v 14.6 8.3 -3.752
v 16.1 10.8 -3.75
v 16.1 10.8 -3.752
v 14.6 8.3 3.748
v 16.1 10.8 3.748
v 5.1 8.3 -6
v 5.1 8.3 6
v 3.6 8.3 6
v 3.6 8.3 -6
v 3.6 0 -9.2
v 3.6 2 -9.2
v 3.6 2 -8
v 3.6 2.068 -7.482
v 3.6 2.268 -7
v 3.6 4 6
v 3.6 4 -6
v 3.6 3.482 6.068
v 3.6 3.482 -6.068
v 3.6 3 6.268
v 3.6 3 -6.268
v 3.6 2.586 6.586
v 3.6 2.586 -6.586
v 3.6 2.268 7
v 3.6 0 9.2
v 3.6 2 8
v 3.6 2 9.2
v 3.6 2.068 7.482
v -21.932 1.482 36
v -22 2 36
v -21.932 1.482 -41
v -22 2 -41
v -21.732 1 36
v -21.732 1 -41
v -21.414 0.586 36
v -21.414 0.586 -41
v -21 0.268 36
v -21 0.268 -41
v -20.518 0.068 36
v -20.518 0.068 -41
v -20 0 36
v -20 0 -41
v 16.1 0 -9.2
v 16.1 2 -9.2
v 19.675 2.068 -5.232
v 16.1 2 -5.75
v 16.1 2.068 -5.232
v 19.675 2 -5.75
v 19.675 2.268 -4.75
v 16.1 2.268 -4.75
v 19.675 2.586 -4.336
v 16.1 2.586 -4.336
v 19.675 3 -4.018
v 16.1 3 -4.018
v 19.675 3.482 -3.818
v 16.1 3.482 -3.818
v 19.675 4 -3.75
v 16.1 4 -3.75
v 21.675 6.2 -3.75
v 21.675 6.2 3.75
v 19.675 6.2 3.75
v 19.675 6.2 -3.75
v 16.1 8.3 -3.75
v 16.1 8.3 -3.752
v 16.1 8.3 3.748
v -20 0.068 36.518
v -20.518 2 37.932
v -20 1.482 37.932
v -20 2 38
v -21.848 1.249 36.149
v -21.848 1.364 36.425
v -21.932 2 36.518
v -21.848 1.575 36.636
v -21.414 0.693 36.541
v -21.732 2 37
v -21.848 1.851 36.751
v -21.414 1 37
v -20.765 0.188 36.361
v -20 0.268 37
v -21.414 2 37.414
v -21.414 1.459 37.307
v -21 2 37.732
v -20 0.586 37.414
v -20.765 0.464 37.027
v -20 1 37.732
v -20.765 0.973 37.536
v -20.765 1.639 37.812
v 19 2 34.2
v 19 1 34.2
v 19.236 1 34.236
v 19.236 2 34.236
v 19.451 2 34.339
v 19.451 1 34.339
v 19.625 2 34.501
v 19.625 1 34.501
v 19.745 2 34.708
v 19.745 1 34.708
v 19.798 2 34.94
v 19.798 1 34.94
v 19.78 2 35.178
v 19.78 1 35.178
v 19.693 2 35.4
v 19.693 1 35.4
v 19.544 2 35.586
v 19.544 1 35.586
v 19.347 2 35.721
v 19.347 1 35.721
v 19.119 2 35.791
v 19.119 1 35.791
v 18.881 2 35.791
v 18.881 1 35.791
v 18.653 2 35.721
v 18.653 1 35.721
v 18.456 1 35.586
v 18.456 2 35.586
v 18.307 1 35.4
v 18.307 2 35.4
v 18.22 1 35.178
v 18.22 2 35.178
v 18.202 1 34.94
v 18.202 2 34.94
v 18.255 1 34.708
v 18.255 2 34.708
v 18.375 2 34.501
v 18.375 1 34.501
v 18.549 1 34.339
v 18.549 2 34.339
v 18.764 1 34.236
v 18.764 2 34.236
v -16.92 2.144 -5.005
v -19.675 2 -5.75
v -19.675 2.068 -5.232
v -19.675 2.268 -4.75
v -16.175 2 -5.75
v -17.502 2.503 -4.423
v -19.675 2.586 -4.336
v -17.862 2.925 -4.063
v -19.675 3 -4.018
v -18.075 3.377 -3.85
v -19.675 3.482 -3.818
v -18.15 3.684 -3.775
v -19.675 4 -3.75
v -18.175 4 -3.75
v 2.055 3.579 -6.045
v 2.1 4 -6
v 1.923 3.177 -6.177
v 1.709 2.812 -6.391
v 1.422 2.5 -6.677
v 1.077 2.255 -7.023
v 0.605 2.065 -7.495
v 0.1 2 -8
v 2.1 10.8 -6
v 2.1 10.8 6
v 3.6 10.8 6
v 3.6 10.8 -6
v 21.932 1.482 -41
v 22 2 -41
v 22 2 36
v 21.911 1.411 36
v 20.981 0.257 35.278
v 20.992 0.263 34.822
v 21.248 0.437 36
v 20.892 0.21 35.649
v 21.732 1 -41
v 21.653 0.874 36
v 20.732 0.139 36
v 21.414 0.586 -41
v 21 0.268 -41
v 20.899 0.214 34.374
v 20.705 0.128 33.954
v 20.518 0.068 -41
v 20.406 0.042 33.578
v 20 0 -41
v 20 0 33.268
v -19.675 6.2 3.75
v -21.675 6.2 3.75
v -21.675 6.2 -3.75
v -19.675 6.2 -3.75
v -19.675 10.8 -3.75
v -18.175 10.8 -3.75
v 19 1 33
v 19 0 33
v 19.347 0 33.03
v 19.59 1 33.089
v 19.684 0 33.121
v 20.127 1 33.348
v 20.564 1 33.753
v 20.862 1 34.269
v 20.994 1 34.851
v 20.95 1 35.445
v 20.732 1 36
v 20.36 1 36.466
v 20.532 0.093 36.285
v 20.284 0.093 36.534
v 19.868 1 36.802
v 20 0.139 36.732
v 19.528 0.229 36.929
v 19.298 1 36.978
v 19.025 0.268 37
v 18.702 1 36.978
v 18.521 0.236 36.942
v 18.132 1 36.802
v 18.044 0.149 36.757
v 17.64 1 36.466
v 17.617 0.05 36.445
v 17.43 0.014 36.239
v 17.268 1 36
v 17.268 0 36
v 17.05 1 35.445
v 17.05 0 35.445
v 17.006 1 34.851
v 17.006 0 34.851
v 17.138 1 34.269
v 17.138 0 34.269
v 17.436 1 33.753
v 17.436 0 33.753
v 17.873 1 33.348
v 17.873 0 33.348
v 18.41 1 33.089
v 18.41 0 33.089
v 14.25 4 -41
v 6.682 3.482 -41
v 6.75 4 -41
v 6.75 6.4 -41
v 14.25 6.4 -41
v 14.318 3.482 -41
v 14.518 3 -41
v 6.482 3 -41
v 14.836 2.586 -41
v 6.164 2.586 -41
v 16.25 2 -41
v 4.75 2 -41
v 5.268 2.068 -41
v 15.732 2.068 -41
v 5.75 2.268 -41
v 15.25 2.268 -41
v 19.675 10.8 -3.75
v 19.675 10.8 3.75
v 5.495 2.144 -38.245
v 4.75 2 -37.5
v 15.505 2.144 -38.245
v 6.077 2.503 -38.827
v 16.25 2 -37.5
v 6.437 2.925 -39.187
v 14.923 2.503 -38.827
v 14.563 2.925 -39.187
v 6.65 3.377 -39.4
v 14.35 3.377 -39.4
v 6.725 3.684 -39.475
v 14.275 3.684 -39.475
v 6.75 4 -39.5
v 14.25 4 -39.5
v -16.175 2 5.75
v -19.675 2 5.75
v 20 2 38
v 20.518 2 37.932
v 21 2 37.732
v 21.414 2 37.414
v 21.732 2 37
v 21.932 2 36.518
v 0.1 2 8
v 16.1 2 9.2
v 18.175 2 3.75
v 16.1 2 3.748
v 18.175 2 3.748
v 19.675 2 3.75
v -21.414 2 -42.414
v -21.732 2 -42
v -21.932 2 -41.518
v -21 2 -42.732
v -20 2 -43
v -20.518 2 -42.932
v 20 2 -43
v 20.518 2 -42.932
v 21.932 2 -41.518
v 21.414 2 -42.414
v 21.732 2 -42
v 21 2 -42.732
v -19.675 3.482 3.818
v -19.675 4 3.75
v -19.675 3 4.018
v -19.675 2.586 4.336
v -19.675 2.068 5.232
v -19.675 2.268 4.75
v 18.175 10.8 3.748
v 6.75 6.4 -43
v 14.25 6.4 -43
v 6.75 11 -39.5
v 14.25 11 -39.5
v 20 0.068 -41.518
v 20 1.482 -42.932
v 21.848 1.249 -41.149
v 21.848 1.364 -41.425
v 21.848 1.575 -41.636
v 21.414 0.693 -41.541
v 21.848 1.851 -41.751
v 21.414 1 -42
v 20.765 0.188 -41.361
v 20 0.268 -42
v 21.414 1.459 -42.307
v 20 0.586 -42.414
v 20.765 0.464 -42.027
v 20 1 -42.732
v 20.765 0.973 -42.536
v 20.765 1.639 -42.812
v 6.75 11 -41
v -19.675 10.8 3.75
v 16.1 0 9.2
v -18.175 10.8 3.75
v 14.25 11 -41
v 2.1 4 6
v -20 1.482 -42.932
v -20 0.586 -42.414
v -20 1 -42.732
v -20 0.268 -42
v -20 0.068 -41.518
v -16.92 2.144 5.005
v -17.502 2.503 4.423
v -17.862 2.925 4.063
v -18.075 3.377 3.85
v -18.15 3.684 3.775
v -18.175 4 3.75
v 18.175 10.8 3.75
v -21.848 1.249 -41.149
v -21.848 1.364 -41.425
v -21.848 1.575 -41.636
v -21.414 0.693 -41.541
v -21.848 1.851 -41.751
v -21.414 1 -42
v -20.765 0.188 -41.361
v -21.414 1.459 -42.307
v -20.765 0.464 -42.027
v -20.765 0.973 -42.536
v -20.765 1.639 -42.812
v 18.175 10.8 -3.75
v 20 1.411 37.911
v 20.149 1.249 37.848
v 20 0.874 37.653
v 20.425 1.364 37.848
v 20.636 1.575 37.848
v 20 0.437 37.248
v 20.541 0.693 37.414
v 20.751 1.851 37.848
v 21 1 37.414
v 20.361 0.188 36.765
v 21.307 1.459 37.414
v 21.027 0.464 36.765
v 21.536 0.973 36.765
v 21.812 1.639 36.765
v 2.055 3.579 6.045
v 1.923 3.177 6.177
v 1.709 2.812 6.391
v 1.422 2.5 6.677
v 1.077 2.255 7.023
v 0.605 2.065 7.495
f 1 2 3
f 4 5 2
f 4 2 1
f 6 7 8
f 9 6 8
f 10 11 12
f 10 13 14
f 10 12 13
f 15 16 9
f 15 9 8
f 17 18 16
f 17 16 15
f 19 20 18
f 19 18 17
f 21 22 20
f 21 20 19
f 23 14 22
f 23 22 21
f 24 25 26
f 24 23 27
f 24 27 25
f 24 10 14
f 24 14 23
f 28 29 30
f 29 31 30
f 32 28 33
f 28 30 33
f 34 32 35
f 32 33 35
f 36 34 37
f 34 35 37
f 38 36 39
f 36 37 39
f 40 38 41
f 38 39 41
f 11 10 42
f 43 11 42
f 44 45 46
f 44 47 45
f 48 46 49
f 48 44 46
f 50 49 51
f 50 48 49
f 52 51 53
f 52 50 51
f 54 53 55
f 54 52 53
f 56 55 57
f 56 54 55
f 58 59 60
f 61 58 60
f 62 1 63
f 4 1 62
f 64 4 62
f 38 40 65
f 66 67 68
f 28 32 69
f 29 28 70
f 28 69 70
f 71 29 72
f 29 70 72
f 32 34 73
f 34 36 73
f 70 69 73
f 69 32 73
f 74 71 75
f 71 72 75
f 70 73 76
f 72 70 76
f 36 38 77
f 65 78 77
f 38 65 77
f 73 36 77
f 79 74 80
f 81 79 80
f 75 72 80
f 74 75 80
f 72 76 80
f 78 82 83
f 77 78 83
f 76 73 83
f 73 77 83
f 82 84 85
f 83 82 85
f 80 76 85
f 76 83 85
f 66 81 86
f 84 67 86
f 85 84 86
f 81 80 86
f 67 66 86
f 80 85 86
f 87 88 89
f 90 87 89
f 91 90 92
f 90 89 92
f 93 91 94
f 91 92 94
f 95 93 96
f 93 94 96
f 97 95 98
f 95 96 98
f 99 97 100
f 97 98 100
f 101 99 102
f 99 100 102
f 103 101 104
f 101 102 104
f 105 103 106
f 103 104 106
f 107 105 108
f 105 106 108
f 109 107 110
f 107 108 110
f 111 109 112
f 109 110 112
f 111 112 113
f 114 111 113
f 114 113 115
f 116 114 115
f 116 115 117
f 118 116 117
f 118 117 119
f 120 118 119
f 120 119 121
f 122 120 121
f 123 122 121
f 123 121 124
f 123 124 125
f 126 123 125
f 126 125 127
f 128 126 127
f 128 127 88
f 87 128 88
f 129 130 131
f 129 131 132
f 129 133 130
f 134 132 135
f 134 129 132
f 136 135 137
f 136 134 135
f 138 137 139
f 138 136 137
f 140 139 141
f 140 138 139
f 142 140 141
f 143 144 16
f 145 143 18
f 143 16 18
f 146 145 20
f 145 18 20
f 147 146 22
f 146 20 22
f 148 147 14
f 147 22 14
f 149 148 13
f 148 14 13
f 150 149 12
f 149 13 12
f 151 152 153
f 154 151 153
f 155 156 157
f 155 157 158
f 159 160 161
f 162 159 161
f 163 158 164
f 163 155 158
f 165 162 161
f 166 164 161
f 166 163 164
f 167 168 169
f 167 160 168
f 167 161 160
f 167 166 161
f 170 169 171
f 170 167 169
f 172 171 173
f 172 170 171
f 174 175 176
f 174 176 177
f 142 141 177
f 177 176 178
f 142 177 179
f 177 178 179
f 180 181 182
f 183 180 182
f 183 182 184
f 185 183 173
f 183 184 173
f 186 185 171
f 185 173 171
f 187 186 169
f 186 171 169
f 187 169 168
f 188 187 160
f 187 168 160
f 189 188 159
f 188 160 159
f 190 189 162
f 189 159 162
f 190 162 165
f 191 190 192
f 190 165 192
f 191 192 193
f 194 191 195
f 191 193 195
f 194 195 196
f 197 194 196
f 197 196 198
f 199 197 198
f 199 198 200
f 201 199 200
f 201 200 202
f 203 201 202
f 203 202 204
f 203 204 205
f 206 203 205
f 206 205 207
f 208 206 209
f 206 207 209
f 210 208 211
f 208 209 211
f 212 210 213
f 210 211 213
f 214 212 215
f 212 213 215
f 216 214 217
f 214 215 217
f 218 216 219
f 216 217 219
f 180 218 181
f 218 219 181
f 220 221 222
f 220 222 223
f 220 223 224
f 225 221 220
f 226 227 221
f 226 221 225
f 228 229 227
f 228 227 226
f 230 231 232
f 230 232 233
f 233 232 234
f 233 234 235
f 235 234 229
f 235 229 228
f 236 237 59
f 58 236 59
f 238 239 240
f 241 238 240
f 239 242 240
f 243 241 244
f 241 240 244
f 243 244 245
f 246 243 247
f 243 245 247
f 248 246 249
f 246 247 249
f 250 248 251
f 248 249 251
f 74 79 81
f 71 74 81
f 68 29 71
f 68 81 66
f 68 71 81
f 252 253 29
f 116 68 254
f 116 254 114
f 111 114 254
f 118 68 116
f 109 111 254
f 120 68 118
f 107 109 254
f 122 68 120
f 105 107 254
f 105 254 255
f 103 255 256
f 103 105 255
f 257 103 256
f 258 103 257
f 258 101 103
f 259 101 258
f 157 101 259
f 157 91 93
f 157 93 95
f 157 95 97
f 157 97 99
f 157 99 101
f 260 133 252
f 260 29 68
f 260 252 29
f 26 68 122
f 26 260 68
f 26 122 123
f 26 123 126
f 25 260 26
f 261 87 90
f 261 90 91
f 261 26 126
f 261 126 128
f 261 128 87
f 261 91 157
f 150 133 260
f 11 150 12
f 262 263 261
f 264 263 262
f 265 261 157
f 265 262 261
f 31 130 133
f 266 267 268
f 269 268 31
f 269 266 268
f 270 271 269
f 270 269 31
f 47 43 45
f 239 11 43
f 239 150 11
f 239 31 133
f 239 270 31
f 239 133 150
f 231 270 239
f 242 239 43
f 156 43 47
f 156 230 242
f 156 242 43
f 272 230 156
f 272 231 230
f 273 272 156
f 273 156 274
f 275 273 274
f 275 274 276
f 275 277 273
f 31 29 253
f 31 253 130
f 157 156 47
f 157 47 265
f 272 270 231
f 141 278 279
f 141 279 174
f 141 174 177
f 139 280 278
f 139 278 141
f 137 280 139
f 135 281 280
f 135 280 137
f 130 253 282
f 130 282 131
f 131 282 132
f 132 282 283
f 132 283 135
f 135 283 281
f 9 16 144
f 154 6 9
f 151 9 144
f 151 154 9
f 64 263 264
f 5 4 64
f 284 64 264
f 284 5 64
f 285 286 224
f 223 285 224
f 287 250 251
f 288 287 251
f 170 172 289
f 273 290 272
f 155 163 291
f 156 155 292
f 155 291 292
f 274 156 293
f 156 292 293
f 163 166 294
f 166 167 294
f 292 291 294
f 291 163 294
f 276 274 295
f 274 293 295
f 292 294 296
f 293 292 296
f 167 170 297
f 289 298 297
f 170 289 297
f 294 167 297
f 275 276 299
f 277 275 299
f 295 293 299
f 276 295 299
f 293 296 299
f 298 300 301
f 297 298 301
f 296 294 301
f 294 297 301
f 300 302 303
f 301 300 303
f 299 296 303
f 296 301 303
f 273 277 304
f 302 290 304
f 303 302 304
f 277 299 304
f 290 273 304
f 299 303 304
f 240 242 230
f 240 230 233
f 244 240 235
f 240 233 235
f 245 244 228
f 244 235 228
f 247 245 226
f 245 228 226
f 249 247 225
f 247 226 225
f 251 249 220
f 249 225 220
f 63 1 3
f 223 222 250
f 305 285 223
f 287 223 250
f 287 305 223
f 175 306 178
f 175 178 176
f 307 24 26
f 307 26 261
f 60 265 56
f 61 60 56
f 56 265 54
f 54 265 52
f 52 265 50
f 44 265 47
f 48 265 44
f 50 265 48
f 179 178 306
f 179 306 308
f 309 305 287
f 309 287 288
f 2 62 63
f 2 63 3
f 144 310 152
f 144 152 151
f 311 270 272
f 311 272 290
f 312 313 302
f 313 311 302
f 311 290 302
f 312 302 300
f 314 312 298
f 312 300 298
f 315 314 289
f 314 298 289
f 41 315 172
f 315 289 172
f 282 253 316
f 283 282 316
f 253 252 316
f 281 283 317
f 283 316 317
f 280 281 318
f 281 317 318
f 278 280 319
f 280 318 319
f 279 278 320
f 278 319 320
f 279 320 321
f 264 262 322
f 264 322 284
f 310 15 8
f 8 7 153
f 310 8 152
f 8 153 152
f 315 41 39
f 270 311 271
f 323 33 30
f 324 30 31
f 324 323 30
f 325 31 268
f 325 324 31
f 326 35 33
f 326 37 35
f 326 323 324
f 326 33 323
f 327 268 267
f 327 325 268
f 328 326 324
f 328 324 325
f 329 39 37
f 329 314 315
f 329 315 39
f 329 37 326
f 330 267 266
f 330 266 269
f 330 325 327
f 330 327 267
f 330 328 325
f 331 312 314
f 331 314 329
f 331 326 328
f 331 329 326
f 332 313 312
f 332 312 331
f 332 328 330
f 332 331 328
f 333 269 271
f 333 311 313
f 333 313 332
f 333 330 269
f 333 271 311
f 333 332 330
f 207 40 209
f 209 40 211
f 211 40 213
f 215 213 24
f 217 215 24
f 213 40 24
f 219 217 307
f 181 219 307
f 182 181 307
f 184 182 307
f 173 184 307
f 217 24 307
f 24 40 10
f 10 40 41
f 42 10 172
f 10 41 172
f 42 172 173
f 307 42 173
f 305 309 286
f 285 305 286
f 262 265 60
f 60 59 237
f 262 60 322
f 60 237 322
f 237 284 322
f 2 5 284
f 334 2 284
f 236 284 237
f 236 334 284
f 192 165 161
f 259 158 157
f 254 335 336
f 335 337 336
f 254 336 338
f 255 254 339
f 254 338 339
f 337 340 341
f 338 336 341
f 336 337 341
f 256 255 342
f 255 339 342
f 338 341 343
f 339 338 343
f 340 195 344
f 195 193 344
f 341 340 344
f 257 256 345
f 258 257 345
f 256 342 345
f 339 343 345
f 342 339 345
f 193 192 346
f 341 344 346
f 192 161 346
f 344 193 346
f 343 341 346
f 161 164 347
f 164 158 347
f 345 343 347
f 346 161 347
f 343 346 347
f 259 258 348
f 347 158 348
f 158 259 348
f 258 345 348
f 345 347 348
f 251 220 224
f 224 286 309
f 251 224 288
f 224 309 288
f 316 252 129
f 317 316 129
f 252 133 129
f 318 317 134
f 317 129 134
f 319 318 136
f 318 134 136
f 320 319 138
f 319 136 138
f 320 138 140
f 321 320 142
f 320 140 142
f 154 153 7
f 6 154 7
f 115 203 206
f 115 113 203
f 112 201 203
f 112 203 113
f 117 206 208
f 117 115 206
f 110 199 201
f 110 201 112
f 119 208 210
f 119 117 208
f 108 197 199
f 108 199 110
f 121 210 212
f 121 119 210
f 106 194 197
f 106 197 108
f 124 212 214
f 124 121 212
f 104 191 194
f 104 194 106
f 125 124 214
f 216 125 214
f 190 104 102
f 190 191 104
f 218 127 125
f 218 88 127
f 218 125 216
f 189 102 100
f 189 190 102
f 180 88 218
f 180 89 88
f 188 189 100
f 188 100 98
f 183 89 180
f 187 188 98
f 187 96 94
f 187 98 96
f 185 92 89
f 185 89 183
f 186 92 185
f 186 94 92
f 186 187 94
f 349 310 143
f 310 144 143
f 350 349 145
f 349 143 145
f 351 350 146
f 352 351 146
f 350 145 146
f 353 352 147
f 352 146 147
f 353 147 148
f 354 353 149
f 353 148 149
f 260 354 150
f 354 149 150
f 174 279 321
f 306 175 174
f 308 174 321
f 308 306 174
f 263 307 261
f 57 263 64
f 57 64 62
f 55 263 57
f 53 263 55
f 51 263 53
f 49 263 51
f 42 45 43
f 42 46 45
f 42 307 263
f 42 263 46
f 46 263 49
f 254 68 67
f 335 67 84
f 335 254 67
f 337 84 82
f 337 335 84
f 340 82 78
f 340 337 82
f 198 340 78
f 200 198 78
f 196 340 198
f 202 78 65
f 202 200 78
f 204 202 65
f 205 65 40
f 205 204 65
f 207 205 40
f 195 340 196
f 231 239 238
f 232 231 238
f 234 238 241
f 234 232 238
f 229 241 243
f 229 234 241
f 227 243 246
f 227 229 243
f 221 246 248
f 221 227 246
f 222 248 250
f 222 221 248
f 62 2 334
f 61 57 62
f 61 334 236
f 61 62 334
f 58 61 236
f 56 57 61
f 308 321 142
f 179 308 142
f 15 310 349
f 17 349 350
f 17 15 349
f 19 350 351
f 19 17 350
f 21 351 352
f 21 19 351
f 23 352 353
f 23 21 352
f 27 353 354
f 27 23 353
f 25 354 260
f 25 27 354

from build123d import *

# Parameters (mm, degrees)
SKETCH_1_W          = 44
SKETCH_1_H          = 81
EXTRUDE_1_DEPTH     = 2
FILLET_1_R          = 2
SKETCH_4_W          = 1.5
SKETCH_4_H          = 7.5
EXTRUDE_4_DEPTH     = 8.8
EXTRUDE_5_DEPTH     = 7.5
SKETCH_7_R          = 0.8
CUT_EXTRUDE_1_DEPTH = 8.8
SKETCH_8_R          = 2
CUT_EXTRUDE_2_DEPTH = 1
SKETCH_10_W         = 7.5
SKETCH_10_H         = 1.5
EXTRUDE_6_DEPTH     = 9
EXTRUDE_7_DEPTH     = 7.5
SKETCH_12_W         = 12.5
SKETCH_12_H         = 18.4
CUT_EXTRUDE_3_DEPTH = 7.5
SKETCH_13_W         = 2.075122626
SKETCH_13_H         = 7.498383059
EXTRUDE_8_DEPTH     = 8.8
EXTRUDE_9_DEPTH     = 7.5
SKETCH_15_W         = 1.5
SKETCH_15_H         = 12
EXTRUDE_10_DEPTH    = 8.8
EXTRUDE_11_DEPTH    = 12
FILLET_2_R          = 2


with BuildPart() as part:
    # 草图1 → 凸台-拉伸1 (new body)
    with BuildSketch(Plane(origin=(0, 0, 0), x_dir=(1, 0, 0), z_dir=(0, 1, 0))):
        with Locations((0, 2.5)):
            Rectangle(SKETCH_1_W, SKETCH_1_H)
    extrude(amount=EXTRUDE_1_DEPTH)

    # 圆角1
    fillet_1_edges = [part.edges().sort_by_distance(p)[0] for p in [
        (0, 0, -43),
        (22, 0, -2.5),
        (0, 0, 38),
        (-22, 0, -2.5),
        (-22, 1, -43),
        (22, 1, -43),
        (22, 1, 38),
        (-22, 1, 38),
    ]]
    fillet(fillet_1_edges, radius=FILLET_1_R - 0.0001)  # a hair under: the kernel refuses the full size

    # 草图4 → 凸台-拉伸4 (add)
    with BuildSketch(Plane(origin=(0, 2, 0), x_dir=(1, 0, 0), z_dir=(0, 1, 0))):
        with Locations((-18.924971335, 0)):
            Rectangle(SKETCH_4_W, SKETCH_4_H)
    extrude_4 = extrude(amount=EXTRUDE_4_DEPTH)

    # 草图6 → 凸台-拉伸5 (add)
    with BuildSketch(Plane.XY.offset(3.75)):
        Polygon((-19.674971335, 10.8), (-21.674971335, 6.2), (-19.674971335, 6.2), align=None)
    extrude_5 = extrude(amount=-EXTRUDE_5_DEPTH)

    # 镜向2: 凸台-拉伸4, 凸台-拉伸5 across plane
    add(extrude_4.mirror(Plane(origin=(0, 0, 0), x_dir=(0, 0, 1), z_dir=(1, 0, 0))))
    add(extrude_5.mirror(Plane(origin=(0, 0, 0), x_dir=(0, 0, 1), z_dir=(1, 0, 0))))

    # 草图7 → 切除-拉伸1 (cut)
    with BuildSketch(Plane.XZ):
        with Locations(Location((19, 35, 0), (0, 0, 270))):
            Circle(SKETCH_7_R)
    extrude(amount=-CUT_EXTRUDE_1_DEPTH, mode=Mode.SUBTRACT)

    # 草图8 → 切除-拉伸2 (cut)
    with BuildSketch(Plane.XZ):
        with Locations(Location((19, 35, 0), (0, 0, 270))):
            Circle(SKETCH_8_R)
    extrude(amount=-CUT_EXTRUDE_2_DEPTH, mode=Mode.SUBTRACT)

    # 草图10 → 凸台-拉伸6 (add)
    with BuildSketch(Plane(origin=(0, 2, 0), x_dir=(1, 0, 0), z_dir=(0, 1, 0))):
        with Locations((10.5, 40.25)):
            Rectangle(SKETCH_10_W, SKETCH_10_H)
    extrude(amount=EXTRUDE_6_DEPTH)

    # 草图11 → 凸台-拉伸7 (add)
    with BuildSketch(Plane(origin=(14.25, 0, 0), x_dir=(0, 0, -1), z_dir=(1, 0, 0))):
        Polygon((41, 11), (43, 6.4), (41, 6.4), align=None)
    extrude(amount=-EXTRUDE_7_DEPTH)

    # 草图12 → 切除-拉伸3 (cut)
    with BuildSketch(Plane.XZ):
        with Locations((9.849848709, 0)):
            Rectangle(SKETCH_12_W, SKETCH_12_H)
    extrude(amount=-CUT_EXTRUDE_3_DEPTH, mode=Mode.SUBTRACT)

    # 草图13 → 凸台-拉伸8 (add)
    with BuildSketch(Plane(origin=(0, 2, 0), x_dir=(1, 0, 0), z_dir=(0, 1, 0))):
        with Locations((17.137410022, 0.000808471)):
            Rectangle(SKETCH_13_W, SKETCH_13_H)
    extrude(amount=EXTRUDE_8_DEPTH)

    # 草图14 → 凸台-拉伸9 (add)
    with BuildSketch(Plane.XY.offset(3.748383059)):
        Polygon((16.099848709, 10.8), (14.599848709, 8.3), (16.099848709, 8.3), align=None)
    extrude(amount=-EXTRUDE_9_DEPTH)

    # 草图15 → 凸台-拉伸10 (add)
    with BuildSketch(Plane(origin=(0, 2, 0), x_dir=(1, 0, 0), z_dir=(0, 1, 0))):
        with Locations((2.849848709, 0)):
            Rectangle(SKETCH_15_W, SKETCH_15_H)
    extrude(amount=EXTRUDE_10_DEPTH)

    # 草图16 → 凸台-拉伸11 (add)
    with BuildSketch(Plane.XY.offset(6)):
        Polygon((3.599848709, 10.8), (5.099848709, 8.3), (3.599848709, 8.3), align=None)
    extrude(amount=-EXTRUDE_11_DEPTH)

    # 圆角2
    fillet_2_edges = [part.edges().sort_by_distance(p)[0] for p in [
        (6.75, 2, -40.25),
        (10.5, 2, -39.5),
        (14.25, 2, -40.25),
        (2.849848709, 2, -6),
        (2.099848709, 2, 0),
        (2.849848709, 2, 6),
        (-18.924971335, 2, 3.75),
        (-18.174971335, 2, 0),
        (-18.924971335, 2, -3.75),
        (17.887410022, 2, -3.75),
    ]]
    fillet(fillet_2_edges, radius=FILLET_2_R)


solid = part.part
